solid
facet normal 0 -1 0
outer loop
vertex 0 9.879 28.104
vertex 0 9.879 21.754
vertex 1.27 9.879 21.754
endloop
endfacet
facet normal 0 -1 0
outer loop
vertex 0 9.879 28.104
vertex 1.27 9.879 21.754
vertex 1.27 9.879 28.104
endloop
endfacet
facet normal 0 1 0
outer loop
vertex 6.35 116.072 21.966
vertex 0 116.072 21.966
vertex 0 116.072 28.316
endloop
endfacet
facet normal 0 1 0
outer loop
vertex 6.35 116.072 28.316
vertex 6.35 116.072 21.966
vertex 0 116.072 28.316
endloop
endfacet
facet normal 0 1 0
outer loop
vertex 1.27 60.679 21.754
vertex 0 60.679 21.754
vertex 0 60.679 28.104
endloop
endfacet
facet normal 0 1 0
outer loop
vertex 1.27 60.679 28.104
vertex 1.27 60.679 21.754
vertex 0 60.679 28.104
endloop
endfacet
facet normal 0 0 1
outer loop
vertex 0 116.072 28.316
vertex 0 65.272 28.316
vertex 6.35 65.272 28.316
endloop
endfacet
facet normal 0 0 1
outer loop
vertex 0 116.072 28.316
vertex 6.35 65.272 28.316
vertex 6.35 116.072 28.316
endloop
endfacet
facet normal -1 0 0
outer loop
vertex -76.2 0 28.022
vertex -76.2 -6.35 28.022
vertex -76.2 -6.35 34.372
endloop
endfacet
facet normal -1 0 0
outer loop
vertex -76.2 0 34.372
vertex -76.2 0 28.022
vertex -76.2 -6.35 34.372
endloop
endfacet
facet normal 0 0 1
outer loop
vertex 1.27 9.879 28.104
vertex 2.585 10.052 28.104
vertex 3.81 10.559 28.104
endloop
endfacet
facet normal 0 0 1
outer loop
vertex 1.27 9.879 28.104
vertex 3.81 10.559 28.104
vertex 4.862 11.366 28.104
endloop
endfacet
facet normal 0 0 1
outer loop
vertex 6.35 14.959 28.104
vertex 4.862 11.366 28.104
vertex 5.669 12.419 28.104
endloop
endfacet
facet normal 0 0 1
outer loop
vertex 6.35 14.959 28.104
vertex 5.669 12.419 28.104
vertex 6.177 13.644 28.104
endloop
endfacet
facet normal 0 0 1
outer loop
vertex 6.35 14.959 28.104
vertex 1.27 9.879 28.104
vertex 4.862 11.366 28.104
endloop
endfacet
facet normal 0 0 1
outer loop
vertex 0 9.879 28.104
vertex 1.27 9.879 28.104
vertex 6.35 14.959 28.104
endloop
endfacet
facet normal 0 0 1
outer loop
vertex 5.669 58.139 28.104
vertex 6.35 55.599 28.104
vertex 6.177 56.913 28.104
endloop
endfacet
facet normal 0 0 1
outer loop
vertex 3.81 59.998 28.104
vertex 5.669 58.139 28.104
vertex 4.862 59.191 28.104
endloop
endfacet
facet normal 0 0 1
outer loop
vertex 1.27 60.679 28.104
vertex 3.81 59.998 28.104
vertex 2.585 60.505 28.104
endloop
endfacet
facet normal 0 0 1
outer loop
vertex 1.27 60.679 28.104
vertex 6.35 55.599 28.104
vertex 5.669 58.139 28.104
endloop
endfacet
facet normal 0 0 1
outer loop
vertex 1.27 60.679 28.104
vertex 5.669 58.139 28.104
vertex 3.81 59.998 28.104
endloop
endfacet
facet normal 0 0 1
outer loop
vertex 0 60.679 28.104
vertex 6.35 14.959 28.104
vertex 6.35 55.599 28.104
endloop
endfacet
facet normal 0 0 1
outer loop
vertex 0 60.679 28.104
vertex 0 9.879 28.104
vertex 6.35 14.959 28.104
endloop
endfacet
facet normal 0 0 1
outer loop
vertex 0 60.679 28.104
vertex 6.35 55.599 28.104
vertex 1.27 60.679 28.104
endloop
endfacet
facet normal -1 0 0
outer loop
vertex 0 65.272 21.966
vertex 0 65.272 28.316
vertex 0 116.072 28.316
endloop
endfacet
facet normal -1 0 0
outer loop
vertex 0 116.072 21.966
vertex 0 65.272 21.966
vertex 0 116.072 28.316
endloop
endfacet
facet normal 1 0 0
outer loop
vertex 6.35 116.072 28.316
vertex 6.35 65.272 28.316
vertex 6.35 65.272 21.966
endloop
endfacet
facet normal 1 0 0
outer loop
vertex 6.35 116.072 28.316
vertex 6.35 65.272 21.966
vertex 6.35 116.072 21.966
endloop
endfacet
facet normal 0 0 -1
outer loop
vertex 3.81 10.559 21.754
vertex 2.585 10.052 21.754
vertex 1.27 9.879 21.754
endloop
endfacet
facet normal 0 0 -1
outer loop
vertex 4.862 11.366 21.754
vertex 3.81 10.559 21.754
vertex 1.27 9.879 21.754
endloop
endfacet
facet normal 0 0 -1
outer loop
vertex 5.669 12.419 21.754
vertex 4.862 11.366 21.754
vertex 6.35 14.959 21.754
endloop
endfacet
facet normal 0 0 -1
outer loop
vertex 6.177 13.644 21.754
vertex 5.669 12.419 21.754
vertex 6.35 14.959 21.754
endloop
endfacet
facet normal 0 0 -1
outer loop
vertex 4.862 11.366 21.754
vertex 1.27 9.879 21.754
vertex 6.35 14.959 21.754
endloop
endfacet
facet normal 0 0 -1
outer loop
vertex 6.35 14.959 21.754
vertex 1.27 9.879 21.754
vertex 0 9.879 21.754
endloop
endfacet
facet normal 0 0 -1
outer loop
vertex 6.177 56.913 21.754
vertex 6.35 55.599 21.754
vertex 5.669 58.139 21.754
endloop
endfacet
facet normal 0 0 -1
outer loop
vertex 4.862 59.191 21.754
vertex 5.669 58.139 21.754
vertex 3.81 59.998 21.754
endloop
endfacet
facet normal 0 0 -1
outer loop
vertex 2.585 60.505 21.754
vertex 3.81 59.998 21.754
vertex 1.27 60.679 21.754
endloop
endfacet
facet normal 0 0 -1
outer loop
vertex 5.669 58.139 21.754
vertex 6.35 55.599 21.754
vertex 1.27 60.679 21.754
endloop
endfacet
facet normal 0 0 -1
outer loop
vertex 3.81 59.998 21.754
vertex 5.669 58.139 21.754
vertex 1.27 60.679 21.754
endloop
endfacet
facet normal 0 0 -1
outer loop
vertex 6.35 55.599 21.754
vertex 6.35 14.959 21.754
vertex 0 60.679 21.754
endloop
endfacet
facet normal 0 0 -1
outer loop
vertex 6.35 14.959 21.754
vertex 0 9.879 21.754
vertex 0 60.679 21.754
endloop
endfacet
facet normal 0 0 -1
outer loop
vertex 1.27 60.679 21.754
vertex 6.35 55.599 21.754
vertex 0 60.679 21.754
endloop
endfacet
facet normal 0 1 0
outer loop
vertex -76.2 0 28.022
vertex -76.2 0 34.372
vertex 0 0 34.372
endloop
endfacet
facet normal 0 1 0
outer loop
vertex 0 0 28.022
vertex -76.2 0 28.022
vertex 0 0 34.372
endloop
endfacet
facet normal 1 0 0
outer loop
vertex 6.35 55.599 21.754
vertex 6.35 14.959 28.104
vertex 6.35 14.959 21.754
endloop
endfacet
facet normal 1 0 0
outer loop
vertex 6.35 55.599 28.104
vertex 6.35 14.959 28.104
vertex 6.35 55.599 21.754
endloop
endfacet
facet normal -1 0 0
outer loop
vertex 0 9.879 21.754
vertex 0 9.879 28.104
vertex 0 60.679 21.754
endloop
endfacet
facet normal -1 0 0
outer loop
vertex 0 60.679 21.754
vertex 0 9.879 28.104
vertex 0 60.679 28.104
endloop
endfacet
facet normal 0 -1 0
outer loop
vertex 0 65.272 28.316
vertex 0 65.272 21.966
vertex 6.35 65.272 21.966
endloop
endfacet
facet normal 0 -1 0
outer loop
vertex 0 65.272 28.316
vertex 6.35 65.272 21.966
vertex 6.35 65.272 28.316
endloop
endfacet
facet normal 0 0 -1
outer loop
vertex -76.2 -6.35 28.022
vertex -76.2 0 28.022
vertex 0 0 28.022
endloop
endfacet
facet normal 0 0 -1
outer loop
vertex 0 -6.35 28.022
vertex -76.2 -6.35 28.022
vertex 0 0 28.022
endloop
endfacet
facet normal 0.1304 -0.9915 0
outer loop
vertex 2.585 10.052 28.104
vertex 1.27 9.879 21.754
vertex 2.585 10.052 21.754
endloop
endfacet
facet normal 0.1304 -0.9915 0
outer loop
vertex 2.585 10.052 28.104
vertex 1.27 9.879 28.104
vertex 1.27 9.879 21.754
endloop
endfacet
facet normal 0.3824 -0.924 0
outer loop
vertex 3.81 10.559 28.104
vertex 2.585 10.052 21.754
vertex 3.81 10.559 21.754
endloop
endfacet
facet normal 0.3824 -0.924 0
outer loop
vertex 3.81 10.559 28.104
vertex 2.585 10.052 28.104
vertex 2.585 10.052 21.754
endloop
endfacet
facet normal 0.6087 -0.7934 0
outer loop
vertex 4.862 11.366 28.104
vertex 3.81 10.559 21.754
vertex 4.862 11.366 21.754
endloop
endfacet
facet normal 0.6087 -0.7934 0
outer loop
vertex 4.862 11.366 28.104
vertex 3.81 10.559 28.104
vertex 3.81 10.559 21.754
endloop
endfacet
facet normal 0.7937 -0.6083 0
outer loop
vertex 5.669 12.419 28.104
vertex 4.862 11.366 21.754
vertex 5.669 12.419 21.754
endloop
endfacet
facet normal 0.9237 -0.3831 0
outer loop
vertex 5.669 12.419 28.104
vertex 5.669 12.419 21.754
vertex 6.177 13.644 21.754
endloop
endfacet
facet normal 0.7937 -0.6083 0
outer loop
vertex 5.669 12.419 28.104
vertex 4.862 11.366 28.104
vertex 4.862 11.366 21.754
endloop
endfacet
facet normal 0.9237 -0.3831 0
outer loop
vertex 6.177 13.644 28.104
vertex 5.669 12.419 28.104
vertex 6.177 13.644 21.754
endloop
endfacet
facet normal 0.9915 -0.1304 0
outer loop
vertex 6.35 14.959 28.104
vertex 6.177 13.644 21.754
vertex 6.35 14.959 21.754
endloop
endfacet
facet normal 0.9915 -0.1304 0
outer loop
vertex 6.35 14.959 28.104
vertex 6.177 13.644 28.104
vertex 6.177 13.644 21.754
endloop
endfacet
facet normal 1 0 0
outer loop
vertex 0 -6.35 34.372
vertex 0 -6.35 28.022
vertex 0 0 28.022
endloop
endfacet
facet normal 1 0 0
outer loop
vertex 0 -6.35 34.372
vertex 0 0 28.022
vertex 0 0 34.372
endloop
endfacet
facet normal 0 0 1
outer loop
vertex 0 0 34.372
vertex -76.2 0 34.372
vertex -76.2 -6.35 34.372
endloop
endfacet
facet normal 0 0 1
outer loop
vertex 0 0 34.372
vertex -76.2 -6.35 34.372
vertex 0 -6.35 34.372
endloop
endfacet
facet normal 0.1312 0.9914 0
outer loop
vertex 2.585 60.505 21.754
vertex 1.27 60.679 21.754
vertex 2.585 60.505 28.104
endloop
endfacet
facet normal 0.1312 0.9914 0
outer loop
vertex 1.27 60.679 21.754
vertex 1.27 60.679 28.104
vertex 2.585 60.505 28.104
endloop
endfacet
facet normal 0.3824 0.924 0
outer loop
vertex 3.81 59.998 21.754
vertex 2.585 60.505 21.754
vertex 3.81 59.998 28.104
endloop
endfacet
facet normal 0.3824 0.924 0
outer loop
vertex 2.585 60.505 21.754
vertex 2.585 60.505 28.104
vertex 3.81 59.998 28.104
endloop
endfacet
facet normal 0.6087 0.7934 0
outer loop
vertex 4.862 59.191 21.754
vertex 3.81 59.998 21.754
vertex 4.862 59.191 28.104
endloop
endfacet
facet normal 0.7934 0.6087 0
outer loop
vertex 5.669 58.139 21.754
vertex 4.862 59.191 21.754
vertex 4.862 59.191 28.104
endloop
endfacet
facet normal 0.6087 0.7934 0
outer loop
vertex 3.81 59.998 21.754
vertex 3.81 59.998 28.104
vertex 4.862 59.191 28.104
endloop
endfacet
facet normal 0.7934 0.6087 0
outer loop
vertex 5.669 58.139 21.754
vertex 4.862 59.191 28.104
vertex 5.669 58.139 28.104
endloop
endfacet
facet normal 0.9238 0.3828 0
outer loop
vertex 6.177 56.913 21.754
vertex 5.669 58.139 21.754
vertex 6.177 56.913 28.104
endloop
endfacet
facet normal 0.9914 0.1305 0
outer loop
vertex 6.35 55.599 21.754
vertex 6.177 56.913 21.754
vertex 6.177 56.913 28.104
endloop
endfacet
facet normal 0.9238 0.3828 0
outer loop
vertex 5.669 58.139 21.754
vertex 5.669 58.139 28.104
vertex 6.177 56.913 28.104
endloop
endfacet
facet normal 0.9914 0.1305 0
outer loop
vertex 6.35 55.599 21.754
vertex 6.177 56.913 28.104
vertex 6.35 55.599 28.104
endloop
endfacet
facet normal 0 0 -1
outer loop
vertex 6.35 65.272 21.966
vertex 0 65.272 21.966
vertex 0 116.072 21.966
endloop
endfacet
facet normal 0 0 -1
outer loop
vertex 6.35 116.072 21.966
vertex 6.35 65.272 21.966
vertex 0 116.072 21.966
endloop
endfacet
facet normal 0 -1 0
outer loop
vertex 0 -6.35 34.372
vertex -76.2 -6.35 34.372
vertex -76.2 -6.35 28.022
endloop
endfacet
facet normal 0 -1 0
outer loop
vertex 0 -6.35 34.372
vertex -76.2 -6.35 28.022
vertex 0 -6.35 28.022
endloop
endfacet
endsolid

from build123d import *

# Parameters (mm, degrees)
F0_W     = 76.2
F0_H     = 6.35
F1_DEPTH = 6.35
F2_W     = 50.8
F2_H     = 6.35
F3_DEPTH = 6.35
F4_W     = 50.8
F4_H     = 6.35
F5_DEPTH = 6.35
F6_R     = 5.08


with BuildPart() as f1:
    # F0 (on Front) → F1 (new body)
    with BuildSketch(Plane.XZ):
        with Locations((-38.1, 31.196937)):
            Rectangle(F0_W, F0_H)
    extrude(amount=F1_DEPTH)


with BuildPart() as f3:
    # F2 (on Right) → F3 (new body)
    with BuildSketch(Plane.YZ):
        with Locations((90.672327, 25.140912)):
            Rectangle(F2_W, F2_H)
    extrude(amount=F3_DEPTH)


with BuildPart() as f5:
    # F4 (on Right) → F5 (new body)
    with BuildSketch(Plane.YZ):
        with Locations((35.278583, 24.92887)):
            Rectangle(F4_W, F4_H)
    extrude(amount=F5_DEPTH)

    # F6
    f6_edges = [f5.edges().sort_by_distance(p)[0] for p in [
        (6.35, 9.878583, 24.92887),
        (6.35, 60.678583, 24.92887),
    ]]
    fillet(f6_edges, radius=F6_R)


solid = Compound([f1.part, f3.part, f5.part])
